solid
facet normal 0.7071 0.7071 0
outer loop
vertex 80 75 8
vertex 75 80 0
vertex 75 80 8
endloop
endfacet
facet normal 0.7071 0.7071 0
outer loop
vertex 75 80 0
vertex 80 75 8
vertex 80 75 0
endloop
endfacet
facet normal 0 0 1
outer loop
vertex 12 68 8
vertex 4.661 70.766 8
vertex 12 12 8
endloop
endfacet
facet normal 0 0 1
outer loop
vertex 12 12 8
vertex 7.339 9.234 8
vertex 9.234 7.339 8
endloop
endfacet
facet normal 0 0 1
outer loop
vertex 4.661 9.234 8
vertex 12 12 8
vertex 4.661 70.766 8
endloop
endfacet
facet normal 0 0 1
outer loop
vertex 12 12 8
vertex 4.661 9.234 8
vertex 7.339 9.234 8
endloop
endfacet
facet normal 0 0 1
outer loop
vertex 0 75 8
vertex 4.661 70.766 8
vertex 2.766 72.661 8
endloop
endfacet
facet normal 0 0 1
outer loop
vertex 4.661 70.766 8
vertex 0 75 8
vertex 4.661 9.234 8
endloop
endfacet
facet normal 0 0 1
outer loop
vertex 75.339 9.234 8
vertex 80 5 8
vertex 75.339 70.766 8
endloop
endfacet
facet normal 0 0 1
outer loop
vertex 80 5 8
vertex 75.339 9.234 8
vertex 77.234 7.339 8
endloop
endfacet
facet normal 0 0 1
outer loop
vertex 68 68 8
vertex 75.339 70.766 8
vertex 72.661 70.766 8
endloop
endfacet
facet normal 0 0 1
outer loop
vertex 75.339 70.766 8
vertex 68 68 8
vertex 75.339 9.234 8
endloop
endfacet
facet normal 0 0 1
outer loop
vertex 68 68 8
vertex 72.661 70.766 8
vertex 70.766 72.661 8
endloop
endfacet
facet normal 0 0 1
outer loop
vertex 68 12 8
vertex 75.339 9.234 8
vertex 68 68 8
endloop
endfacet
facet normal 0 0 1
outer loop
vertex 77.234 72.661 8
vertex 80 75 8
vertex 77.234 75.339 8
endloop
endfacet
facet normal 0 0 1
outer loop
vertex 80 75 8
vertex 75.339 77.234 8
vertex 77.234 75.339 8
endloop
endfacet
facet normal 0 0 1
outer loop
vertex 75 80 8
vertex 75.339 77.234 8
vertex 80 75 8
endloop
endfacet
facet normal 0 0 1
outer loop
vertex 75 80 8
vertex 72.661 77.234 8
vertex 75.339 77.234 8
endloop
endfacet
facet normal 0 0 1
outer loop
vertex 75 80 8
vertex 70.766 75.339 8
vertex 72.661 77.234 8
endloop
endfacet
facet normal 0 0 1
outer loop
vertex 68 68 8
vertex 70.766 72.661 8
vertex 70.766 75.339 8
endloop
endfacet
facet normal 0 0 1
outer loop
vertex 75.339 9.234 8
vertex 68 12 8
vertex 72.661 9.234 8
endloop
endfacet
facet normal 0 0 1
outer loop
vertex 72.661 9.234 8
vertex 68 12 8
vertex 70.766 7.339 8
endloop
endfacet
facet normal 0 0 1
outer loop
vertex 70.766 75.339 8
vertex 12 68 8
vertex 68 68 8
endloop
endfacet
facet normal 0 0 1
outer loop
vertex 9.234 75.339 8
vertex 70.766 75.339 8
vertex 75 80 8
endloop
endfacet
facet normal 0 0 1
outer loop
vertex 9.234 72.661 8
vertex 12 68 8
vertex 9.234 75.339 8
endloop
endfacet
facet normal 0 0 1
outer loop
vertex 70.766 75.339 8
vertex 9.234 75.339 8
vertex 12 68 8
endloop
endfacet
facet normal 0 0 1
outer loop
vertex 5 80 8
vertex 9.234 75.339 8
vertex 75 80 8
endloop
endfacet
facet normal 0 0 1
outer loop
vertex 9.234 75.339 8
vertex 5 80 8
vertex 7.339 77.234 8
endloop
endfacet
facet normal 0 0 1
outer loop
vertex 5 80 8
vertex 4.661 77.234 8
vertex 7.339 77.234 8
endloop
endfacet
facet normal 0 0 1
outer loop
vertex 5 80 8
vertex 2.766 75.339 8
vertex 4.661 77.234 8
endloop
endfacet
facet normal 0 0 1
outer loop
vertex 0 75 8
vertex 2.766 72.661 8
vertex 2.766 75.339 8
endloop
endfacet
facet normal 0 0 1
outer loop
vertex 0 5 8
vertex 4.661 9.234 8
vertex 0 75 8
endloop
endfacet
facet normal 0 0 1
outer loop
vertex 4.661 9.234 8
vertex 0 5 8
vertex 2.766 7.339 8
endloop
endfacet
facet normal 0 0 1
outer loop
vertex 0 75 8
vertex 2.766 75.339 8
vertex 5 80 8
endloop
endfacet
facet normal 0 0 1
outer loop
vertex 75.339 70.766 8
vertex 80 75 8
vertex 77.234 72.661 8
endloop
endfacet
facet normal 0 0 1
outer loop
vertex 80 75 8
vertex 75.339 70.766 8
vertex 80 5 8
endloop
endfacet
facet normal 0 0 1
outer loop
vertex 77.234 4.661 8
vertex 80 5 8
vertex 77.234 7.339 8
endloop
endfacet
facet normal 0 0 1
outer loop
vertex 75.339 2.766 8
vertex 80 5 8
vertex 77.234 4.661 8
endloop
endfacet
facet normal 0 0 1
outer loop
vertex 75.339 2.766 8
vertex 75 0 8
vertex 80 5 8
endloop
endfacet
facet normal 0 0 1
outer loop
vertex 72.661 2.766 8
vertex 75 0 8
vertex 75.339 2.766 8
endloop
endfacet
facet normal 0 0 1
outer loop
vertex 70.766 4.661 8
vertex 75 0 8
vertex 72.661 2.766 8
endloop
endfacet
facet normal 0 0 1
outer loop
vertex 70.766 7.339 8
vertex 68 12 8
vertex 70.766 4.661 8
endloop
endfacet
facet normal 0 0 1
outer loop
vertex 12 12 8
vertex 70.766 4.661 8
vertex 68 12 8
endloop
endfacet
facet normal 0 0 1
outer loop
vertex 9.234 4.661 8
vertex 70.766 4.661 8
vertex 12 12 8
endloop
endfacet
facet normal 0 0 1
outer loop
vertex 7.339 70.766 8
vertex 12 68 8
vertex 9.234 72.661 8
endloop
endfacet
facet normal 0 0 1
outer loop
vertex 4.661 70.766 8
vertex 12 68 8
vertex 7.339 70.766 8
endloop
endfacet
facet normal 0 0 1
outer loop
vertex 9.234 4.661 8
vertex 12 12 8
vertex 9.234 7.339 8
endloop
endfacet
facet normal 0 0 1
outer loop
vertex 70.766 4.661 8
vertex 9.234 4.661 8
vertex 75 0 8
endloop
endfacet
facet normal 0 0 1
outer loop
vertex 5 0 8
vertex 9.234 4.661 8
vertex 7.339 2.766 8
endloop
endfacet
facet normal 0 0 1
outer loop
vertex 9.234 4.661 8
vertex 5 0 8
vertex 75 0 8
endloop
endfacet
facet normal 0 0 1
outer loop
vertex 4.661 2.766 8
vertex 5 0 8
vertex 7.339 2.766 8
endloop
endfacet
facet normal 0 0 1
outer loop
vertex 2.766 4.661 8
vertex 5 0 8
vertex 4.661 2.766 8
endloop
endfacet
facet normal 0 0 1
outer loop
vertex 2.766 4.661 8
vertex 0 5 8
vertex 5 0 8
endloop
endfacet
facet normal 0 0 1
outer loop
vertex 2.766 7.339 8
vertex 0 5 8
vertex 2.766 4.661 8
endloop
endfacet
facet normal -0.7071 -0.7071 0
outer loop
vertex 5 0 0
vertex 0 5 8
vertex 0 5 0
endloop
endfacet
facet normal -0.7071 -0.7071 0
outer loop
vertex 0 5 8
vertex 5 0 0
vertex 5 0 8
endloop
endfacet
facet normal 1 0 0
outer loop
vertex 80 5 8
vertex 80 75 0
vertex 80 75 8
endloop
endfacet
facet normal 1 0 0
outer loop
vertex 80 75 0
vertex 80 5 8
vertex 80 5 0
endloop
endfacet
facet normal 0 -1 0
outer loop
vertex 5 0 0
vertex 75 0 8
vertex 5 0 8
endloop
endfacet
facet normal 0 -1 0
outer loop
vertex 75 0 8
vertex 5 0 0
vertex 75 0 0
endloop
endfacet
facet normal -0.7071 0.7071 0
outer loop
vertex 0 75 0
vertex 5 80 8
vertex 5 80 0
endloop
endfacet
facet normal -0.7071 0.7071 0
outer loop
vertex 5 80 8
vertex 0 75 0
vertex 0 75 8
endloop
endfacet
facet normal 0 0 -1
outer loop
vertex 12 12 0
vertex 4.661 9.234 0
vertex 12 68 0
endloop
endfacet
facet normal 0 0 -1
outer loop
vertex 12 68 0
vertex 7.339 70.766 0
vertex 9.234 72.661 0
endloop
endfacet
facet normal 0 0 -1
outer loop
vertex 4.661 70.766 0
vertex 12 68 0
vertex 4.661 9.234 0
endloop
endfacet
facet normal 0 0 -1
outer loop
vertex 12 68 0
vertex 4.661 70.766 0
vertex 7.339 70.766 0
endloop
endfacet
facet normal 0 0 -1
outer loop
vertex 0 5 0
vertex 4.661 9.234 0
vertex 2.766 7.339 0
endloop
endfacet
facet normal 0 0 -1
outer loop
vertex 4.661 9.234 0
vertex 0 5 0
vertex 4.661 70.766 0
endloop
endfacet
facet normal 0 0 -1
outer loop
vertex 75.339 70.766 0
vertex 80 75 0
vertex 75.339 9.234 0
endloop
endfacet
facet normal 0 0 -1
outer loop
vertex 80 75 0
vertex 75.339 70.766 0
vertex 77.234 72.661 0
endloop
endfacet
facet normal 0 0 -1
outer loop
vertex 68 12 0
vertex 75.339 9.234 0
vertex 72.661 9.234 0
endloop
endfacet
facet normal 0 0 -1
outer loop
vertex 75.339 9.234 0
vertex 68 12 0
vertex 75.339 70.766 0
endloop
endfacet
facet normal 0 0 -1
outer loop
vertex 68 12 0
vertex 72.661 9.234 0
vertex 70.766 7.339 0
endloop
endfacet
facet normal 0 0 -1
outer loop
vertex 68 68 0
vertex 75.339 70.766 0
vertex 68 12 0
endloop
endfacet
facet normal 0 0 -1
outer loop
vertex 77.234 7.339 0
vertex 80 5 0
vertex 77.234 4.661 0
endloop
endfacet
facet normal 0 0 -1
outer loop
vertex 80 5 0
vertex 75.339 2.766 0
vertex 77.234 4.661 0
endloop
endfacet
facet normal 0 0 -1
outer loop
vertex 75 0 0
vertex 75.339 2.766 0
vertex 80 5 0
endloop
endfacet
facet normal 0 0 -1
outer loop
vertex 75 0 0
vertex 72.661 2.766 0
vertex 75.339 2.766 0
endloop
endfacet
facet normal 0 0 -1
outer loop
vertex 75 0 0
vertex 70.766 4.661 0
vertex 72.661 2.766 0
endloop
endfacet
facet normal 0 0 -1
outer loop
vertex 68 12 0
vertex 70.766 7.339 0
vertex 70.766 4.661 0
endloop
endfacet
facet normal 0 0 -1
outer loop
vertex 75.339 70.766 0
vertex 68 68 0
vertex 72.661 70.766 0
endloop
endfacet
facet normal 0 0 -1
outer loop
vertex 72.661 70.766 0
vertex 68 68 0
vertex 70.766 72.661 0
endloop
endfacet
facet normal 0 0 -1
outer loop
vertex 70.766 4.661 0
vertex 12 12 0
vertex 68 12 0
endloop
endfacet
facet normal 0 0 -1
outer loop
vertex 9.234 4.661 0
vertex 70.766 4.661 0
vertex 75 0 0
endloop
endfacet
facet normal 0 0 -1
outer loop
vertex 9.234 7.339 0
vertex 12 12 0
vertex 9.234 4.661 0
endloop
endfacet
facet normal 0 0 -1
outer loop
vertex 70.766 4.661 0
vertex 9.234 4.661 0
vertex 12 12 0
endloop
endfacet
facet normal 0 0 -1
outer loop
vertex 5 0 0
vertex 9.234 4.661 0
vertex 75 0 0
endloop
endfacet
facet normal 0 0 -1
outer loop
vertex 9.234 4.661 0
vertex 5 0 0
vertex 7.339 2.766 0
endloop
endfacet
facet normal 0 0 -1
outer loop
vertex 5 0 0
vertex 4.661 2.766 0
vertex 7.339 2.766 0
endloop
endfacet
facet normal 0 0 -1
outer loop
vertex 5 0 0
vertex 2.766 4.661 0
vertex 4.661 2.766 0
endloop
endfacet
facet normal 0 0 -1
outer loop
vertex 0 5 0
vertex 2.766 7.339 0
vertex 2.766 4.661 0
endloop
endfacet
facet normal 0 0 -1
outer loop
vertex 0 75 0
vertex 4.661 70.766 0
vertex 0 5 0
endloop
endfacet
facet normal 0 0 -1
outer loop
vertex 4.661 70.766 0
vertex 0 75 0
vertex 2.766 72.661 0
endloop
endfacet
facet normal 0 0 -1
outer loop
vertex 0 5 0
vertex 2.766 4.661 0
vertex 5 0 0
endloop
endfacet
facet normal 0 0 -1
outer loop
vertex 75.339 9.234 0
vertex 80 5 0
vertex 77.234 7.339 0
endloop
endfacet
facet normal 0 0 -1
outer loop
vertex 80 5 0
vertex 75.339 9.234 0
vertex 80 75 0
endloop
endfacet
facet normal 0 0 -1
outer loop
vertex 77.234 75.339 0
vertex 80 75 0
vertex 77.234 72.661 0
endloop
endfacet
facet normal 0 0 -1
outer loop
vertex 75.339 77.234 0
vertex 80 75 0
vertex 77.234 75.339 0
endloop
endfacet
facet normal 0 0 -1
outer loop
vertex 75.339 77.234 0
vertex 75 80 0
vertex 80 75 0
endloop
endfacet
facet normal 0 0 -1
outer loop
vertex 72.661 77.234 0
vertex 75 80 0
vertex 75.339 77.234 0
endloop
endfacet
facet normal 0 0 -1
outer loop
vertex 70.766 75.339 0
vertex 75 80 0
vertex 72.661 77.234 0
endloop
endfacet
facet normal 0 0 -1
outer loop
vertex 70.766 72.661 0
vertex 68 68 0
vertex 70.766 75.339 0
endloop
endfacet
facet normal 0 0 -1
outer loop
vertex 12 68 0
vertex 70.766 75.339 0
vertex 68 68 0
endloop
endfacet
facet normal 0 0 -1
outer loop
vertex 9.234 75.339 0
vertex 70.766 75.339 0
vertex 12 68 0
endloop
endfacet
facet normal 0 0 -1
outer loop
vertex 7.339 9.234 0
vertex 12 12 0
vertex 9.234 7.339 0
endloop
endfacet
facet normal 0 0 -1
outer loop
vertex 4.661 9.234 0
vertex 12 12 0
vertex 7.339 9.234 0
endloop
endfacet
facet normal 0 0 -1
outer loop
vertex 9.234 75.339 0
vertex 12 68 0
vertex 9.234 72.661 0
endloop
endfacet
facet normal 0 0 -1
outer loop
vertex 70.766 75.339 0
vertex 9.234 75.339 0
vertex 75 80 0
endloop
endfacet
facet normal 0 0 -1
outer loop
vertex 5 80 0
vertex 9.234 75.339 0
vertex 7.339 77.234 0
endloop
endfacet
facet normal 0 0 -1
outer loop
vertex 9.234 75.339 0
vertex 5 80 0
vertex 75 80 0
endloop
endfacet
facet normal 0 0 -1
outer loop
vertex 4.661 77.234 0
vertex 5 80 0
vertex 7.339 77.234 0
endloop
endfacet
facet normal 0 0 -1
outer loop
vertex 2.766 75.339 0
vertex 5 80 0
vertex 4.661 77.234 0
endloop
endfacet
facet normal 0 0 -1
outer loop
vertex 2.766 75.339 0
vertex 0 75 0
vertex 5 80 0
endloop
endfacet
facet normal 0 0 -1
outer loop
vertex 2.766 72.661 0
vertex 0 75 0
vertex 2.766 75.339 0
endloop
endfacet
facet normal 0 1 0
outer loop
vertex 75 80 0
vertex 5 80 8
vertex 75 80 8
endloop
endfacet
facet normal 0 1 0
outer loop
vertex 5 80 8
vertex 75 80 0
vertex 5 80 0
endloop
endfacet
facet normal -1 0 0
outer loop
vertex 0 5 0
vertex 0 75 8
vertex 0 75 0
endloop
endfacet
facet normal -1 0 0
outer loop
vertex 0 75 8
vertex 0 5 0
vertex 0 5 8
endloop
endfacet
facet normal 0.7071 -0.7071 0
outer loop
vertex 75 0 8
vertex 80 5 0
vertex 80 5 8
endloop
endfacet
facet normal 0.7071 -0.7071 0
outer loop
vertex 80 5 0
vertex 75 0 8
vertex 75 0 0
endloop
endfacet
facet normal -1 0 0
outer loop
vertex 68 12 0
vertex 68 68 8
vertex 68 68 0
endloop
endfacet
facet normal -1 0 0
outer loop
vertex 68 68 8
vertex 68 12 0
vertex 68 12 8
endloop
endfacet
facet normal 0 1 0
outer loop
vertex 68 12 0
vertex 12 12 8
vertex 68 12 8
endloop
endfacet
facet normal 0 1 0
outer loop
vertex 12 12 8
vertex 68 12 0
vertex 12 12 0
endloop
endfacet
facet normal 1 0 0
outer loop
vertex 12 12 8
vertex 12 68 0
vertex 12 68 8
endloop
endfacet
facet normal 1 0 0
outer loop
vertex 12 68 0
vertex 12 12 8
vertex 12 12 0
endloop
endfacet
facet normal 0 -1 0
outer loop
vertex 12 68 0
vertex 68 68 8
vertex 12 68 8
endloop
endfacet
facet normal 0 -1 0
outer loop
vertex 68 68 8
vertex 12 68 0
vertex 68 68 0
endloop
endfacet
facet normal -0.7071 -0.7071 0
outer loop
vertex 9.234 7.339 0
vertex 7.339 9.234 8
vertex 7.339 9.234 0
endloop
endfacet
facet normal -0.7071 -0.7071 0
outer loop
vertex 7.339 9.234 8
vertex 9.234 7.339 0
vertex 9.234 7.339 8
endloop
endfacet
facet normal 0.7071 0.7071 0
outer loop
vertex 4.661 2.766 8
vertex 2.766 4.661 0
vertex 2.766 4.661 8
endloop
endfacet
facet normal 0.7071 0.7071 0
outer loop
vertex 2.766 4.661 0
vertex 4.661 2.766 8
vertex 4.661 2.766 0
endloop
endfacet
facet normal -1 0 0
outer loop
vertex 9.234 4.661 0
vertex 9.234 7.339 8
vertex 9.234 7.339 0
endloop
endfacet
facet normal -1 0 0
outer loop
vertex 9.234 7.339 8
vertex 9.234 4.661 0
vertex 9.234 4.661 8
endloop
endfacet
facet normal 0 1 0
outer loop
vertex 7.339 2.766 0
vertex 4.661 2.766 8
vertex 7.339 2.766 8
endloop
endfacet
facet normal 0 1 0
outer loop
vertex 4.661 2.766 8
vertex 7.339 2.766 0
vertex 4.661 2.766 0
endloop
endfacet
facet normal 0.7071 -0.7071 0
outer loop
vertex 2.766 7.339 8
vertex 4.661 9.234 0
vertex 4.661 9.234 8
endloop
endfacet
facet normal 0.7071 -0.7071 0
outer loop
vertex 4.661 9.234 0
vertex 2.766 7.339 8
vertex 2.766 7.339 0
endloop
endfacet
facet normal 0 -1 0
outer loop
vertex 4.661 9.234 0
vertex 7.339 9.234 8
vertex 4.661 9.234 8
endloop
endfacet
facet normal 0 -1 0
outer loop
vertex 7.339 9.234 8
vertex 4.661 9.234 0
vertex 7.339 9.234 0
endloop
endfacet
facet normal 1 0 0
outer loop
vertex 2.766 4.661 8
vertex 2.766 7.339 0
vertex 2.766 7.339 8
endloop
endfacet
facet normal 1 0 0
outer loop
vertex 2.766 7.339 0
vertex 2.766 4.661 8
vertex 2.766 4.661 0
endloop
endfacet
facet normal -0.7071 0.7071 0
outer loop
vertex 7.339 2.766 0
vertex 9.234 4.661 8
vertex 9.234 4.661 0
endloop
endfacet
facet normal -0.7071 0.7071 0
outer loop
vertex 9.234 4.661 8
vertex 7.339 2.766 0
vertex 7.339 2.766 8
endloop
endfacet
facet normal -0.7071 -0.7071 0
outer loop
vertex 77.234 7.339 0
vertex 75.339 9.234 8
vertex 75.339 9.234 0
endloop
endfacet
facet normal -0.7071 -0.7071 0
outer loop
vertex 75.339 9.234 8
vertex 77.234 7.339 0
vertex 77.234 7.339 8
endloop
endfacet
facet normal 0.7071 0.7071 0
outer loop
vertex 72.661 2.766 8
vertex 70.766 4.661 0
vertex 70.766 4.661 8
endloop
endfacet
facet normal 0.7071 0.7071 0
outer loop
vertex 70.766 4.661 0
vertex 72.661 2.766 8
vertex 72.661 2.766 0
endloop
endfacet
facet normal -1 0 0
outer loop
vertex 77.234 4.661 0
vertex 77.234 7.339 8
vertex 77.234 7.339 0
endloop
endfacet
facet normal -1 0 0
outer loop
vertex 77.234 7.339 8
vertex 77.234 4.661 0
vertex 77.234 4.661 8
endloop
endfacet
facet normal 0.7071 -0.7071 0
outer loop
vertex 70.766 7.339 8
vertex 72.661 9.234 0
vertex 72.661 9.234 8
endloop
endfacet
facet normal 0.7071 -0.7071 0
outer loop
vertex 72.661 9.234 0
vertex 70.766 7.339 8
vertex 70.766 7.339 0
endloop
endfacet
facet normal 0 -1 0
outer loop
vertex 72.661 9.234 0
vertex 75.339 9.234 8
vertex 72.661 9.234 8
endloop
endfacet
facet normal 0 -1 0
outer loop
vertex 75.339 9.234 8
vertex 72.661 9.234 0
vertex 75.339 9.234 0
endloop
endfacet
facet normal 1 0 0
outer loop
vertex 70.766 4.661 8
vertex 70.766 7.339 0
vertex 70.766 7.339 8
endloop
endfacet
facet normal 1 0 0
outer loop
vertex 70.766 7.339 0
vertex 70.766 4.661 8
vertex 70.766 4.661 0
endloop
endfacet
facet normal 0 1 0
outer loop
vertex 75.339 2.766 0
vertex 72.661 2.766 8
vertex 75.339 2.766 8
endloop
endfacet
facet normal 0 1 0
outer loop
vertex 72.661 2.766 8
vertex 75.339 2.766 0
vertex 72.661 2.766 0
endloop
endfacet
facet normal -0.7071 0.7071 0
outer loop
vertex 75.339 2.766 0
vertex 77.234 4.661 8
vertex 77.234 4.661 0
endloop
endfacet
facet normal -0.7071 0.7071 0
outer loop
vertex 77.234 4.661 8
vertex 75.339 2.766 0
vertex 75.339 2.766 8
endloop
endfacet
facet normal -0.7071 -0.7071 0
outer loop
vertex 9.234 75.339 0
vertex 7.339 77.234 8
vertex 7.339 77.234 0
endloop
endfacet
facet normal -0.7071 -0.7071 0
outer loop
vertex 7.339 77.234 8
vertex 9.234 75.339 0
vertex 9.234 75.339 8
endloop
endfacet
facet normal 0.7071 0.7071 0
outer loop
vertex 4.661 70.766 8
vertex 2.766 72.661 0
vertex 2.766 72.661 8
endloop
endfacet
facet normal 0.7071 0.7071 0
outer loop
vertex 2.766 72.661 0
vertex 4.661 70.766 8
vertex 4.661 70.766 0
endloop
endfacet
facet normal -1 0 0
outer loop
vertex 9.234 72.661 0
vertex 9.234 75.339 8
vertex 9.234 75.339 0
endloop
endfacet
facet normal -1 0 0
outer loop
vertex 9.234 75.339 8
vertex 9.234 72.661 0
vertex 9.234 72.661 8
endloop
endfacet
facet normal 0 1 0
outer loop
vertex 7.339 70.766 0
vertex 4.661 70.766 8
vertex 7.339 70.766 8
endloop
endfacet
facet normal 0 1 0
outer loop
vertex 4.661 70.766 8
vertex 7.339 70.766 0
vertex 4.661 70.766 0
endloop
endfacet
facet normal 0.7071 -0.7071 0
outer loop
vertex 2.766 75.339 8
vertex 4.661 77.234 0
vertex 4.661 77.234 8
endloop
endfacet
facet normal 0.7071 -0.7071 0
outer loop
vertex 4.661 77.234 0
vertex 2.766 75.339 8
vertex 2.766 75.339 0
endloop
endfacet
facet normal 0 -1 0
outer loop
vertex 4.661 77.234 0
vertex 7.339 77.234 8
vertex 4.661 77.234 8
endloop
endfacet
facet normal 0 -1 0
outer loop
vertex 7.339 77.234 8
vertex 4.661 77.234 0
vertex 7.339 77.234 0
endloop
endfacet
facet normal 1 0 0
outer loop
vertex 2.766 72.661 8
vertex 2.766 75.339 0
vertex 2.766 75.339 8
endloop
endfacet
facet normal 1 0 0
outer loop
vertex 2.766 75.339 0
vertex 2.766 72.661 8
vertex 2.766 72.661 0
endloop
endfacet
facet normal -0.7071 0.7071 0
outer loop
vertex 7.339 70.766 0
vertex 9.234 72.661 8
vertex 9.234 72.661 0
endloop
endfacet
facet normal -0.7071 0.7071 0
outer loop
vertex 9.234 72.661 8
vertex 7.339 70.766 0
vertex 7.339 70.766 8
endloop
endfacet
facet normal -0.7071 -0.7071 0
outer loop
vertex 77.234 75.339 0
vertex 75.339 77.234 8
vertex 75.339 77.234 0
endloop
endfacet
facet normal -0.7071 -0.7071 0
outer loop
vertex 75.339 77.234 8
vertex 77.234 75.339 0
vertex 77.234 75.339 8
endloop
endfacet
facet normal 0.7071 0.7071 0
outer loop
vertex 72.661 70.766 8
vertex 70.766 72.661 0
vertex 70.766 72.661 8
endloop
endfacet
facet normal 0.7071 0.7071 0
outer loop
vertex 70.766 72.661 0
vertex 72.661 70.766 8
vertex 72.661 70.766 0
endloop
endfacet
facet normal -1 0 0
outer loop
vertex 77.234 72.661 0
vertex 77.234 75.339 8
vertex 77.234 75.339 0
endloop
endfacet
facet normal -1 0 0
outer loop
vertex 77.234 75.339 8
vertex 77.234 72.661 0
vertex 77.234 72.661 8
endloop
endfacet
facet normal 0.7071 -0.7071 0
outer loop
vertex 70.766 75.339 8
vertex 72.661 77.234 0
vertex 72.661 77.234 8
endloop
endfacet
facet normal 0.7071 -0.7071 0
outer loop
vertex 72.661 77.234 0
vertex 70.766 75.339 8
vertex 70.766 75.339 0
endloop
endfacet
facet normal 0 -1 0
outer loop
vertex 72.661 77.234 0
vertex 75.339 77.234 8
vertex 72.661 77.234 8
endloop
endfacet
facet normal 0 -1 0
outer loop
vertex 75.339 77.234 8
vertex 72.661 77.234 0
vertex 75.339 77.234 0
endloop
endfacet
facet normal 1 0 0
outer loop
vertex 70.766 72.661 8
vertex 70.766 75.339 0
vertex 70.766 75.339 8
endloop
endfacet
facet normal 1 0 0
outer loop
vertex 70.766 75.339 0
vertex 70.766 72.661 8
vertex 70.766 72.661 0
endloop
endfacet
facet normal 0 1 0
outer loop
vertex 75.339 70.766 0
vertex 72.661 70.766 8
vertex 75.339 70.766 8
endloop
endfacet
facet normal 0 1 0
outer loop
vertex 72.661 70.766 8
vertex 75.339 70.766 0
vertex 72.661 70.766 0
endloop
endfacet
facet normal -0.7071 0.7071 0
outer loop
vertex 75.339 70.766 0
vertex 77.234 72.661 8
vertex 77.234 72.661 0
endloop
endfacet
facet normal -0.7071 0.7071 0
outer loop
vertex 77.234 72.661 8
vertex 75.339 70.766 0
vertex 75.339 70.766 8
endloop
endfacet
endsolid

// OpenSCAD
$fn = 32;

// ----------------------------------------------------------------------
// Frame plate: 80 x 80 frame, 12 mm rails
// ----------------------------------------------------------------------

// --- parameters (mm) ---
plate_l = 80;             // plate length, X
plate_w = 80;             // plate width, Y
plate_t = 8;              // plate thickness, Z (extrusion height)
corner_c = 5;             // corner chamfer
frame_bar = 12;           // frame rail width
bolt_r = 3.5;             // corner bolt window radius
bolt_inset = 6;           // bolt centre inset from the edges

win_l = plate_l - 2 * frame_bar;  // window length
win_w = plate_w - 2 * frame_bar;  // window width
bolt_d = 2 * bolt_r;  // corner hole diameter

profile = [[5, 0], [75, 0], [80, 5], [80, 75], [75, 80], [5, 80], [0, 75], [0, 5]];  // primary outline, 8 points, counter clockwise
void_1 = [[12, 12], [68, 12], [68, 68], [12, 68]];  // the window, 4 points
void_2 = [[9.234, 7.339], [7.339, 9.234], [4.661, 9.234], [2.766, 7.339], [2.766, 4.661], [4.661, 2.766], [7.339, 2.766], [9.234, 4.661]];  // corner bolt window, 8 points
void_3 = [[77.234, 7.339], [75.339, 9.234], [72.661, 9.234], [70.766, 7.339], [70.766, 4.661], [72.661, 2.766], [75.339, 2.766], [77.234, 4.661]];  // corner bolt window, 8 points
void_4 = [[9.234, 75.339], [7.339, 77.234], [4.661, 77.234], [2.766, 75.339], [2.766, 72.661], [4.661, 70.766], [7.339, 70.766], [9.234, 72.661]];  // corner bolt window, 8 points
void_5 = [[77.234, 75.339], [75.339, 77.234], [72.661, 77.234], [70.766, 75.339], [70.766, 72.661], [72.661, 70.766], [75.339, 70.766], [77.234, 72.661]];  // corner bolt window, 8 points

// --- the one profile operation ---
difference() {
  linear_extrude(height = plate_t) polygon(points = profile);
  translate([0, 0, -1])
    linear_extrude(height = plate_t + 2) polygon(points = void_1);
  translate([0, 0, -1])
    linear_extrude(height = plate_t + 2) polygon(points = void_2);
  translate([0, 0, -1])
    linear_extrude(height = plate_t + 2) polygon(points = void_3);
  translate([0, 0, -1])
    linear_extrude(height = plate_t + 2) polygon(points = void_4);
  translate([0, 0, -1])
    linear_extrude(height = plate_t + 2) polygon(points = void_5);
}
